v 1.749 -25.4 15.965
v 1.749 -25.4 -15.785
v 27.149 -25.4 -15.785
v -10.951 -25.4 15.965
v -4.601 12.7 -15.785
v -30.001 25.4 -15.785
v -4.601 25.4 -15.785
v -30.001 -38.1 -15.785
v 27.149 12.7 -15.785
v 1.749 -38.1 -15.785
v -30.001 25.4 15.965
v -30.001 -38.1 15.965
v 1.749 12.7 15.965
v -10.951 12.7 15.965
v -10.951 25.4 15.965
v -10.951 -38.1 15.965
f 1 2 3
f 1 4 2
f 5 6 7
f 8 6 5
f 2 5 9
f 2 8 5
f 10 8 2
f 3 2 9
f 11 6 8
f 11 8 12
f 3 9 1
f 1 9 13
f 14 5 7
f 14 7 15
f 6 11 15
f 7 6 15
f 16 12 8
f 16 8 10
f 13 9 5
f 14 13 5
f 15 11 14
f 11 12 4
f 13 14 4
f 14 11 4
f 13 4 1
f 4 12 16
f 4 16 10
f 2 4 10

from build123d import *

# Parameters (mm, degrees)
F0_W      = 57.15
F0_H      = 31.75
F1_DEPTH  = 38.1
F3_DEPTH  = 12.7
F5_DEPTH  = 25.4
F6_DEPTH  = 12.7
F7_DEPTH  = 25.4
F9_DEPTH  = 25.4
F11_DEPTH = 50.8


with BuildPart() as f1:
    # F0 (on Front) → F1 (new body)
    with BuildSketch(Plane.XZ):
        with Locations((-1.4262031764, 0.0904835914)):
            Rectangle(F0_W, F0_H)
    extrude(amount=F1_DEPTH)

    # F2 (on face) → F3 (cut)
    with BuildSketch(Plane.XZ.offset(38.1)):
        Polygon((27.1487968236, 15.9654835914), (-10.9512031764, 15.9654835914), (1.7487968236, -15.7845164086), (27.1487968236, -15.7845164086), align=None)
    extrude(amount=-F3_DEPTH, mode=Mode.SUBTRACT)

    # F4 (on face) → F5 (join)
    with BuildSketch(Plane(origin=(0, 0, 0), x_dir=(-1, 0, 0), z_dir=(0, 1, 0))):
        Polygon((4.6012031764, -15.7845164086), (10.9512031764, 15.9654835914), (-27.1487968236, 15.9654835914), (-27.1487968236, -15.7845164086), align=None)
    extrude(amount=F5_DEPTH)

    # F6 (cut): a face of the model
    f6_faces = [f1.faces().sort_by_distance(p)[0] for p in [
        (9.638190763, 25.4, 0.5715441975),
    ]]
    extrude(f6_faces, amount=-F6_DEPTH, mode=Mode.SUBTRACT)

    # F7 (add): a face of the model
    f7_faces = [f1.faces().sort_by_distance(p)[0] for p in [
        (-18.8131079383, 0, -0.6654687896),
    ]]
    extrude(f7_faces, amount=F7_DEPTH)

    # F8 (on face) → F9 (cut)
    with BuildSketch(Plane.XZ.offset(25.4)):
        Polygon((27.1487968236, 15.9654835914), (14.4487968236, 15.9654835914), (27.1487968236, -15.7845164086), align=None)
    extrude(amount=-F9_DEPTH, mode=Mode.SUBTRACT)

    # F10 (on face) → F11 (cut)
    with BuildSketch(Plane(origin=(0, 12.7, 0), x_dir=(-1, 0, 0), z_dir=(0, 1, 0))):
        Polygon((-27.1487968236, -15.7845164086), (-1.7487968236, 15.9654835914), (-27.1487968236, 15.9654835914), align=None)
    extrude(amount=-F11_DEPTH, mode=Mode.SUBTRACT)


solid = f1.part
